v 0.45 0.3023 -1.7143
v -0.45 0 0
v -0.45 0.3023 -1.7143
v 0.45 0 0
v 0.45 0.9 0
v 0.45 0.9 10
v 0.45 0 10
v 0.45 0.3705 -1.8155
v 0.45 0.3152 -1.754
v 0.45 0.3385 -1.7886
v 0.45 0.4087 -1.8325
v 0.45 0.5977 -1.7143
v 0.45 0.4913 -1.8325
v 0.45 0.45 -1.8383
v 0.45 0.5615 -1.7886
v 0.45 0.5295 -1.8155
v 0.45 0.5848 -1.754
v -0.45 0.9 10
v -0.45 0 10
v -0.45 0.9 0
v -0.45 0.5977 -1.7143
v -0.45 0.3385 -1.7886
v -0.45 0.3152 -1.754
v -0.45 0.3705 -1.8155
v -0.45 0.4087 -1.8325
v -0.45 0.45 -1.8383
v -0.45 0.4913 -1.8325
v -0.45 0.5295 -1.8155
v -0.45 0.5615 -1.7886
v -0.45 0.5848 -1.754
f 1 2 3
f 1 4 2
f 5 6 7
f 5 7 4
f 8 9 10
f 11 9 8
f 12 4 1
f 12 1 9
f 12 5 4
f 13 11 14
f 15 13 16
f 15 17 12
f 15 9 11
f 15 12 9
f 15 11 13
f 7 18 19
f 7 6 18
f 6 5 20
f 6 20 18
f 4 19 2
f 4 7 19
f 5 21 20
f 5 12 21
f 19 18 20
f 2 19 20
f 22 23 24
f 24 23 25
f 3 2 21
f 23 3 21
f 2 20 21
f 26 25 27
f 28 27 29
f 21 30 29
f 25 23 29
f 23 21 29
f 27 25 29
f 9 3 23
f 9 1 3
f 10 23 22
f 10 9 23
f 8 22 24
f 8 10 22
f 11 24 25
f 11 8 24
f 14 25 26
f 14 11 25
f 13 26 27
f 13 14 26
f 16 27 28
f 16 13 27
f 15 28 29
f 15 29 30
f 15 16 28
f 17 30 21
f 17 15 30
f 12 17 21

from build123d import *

# Parameters (mm, degrees)
BOSS_EXTRUDE1_DEPTH = 0.45
FILLET1_R           = 0.15


with BuildPart() as part:
    # Sketch1 → Boss-Extrude1 (new, symmetric)
    with BuildSketch(Plane(origin=(0, 0, 0), x_dir=(0, 0, -1), z_dir=(1, 0, 0))):
        Polygon((0, 0), (2.552076819, 0.45), (0, 0.9), (-10, 0.9), (-10, 0), align=None)
    extrude(amount=BOSS_EXTRUDE1_DEPTH, both=True)

    # Fillet1
    fillet1_edges = [part.edges().sort_by_distance(p)[0] for p in [
        (0, 0.45, -2.552076819),
    ]]
    fillet(fillet1_edges, radius=FILLET1_R)


solid = part.part
